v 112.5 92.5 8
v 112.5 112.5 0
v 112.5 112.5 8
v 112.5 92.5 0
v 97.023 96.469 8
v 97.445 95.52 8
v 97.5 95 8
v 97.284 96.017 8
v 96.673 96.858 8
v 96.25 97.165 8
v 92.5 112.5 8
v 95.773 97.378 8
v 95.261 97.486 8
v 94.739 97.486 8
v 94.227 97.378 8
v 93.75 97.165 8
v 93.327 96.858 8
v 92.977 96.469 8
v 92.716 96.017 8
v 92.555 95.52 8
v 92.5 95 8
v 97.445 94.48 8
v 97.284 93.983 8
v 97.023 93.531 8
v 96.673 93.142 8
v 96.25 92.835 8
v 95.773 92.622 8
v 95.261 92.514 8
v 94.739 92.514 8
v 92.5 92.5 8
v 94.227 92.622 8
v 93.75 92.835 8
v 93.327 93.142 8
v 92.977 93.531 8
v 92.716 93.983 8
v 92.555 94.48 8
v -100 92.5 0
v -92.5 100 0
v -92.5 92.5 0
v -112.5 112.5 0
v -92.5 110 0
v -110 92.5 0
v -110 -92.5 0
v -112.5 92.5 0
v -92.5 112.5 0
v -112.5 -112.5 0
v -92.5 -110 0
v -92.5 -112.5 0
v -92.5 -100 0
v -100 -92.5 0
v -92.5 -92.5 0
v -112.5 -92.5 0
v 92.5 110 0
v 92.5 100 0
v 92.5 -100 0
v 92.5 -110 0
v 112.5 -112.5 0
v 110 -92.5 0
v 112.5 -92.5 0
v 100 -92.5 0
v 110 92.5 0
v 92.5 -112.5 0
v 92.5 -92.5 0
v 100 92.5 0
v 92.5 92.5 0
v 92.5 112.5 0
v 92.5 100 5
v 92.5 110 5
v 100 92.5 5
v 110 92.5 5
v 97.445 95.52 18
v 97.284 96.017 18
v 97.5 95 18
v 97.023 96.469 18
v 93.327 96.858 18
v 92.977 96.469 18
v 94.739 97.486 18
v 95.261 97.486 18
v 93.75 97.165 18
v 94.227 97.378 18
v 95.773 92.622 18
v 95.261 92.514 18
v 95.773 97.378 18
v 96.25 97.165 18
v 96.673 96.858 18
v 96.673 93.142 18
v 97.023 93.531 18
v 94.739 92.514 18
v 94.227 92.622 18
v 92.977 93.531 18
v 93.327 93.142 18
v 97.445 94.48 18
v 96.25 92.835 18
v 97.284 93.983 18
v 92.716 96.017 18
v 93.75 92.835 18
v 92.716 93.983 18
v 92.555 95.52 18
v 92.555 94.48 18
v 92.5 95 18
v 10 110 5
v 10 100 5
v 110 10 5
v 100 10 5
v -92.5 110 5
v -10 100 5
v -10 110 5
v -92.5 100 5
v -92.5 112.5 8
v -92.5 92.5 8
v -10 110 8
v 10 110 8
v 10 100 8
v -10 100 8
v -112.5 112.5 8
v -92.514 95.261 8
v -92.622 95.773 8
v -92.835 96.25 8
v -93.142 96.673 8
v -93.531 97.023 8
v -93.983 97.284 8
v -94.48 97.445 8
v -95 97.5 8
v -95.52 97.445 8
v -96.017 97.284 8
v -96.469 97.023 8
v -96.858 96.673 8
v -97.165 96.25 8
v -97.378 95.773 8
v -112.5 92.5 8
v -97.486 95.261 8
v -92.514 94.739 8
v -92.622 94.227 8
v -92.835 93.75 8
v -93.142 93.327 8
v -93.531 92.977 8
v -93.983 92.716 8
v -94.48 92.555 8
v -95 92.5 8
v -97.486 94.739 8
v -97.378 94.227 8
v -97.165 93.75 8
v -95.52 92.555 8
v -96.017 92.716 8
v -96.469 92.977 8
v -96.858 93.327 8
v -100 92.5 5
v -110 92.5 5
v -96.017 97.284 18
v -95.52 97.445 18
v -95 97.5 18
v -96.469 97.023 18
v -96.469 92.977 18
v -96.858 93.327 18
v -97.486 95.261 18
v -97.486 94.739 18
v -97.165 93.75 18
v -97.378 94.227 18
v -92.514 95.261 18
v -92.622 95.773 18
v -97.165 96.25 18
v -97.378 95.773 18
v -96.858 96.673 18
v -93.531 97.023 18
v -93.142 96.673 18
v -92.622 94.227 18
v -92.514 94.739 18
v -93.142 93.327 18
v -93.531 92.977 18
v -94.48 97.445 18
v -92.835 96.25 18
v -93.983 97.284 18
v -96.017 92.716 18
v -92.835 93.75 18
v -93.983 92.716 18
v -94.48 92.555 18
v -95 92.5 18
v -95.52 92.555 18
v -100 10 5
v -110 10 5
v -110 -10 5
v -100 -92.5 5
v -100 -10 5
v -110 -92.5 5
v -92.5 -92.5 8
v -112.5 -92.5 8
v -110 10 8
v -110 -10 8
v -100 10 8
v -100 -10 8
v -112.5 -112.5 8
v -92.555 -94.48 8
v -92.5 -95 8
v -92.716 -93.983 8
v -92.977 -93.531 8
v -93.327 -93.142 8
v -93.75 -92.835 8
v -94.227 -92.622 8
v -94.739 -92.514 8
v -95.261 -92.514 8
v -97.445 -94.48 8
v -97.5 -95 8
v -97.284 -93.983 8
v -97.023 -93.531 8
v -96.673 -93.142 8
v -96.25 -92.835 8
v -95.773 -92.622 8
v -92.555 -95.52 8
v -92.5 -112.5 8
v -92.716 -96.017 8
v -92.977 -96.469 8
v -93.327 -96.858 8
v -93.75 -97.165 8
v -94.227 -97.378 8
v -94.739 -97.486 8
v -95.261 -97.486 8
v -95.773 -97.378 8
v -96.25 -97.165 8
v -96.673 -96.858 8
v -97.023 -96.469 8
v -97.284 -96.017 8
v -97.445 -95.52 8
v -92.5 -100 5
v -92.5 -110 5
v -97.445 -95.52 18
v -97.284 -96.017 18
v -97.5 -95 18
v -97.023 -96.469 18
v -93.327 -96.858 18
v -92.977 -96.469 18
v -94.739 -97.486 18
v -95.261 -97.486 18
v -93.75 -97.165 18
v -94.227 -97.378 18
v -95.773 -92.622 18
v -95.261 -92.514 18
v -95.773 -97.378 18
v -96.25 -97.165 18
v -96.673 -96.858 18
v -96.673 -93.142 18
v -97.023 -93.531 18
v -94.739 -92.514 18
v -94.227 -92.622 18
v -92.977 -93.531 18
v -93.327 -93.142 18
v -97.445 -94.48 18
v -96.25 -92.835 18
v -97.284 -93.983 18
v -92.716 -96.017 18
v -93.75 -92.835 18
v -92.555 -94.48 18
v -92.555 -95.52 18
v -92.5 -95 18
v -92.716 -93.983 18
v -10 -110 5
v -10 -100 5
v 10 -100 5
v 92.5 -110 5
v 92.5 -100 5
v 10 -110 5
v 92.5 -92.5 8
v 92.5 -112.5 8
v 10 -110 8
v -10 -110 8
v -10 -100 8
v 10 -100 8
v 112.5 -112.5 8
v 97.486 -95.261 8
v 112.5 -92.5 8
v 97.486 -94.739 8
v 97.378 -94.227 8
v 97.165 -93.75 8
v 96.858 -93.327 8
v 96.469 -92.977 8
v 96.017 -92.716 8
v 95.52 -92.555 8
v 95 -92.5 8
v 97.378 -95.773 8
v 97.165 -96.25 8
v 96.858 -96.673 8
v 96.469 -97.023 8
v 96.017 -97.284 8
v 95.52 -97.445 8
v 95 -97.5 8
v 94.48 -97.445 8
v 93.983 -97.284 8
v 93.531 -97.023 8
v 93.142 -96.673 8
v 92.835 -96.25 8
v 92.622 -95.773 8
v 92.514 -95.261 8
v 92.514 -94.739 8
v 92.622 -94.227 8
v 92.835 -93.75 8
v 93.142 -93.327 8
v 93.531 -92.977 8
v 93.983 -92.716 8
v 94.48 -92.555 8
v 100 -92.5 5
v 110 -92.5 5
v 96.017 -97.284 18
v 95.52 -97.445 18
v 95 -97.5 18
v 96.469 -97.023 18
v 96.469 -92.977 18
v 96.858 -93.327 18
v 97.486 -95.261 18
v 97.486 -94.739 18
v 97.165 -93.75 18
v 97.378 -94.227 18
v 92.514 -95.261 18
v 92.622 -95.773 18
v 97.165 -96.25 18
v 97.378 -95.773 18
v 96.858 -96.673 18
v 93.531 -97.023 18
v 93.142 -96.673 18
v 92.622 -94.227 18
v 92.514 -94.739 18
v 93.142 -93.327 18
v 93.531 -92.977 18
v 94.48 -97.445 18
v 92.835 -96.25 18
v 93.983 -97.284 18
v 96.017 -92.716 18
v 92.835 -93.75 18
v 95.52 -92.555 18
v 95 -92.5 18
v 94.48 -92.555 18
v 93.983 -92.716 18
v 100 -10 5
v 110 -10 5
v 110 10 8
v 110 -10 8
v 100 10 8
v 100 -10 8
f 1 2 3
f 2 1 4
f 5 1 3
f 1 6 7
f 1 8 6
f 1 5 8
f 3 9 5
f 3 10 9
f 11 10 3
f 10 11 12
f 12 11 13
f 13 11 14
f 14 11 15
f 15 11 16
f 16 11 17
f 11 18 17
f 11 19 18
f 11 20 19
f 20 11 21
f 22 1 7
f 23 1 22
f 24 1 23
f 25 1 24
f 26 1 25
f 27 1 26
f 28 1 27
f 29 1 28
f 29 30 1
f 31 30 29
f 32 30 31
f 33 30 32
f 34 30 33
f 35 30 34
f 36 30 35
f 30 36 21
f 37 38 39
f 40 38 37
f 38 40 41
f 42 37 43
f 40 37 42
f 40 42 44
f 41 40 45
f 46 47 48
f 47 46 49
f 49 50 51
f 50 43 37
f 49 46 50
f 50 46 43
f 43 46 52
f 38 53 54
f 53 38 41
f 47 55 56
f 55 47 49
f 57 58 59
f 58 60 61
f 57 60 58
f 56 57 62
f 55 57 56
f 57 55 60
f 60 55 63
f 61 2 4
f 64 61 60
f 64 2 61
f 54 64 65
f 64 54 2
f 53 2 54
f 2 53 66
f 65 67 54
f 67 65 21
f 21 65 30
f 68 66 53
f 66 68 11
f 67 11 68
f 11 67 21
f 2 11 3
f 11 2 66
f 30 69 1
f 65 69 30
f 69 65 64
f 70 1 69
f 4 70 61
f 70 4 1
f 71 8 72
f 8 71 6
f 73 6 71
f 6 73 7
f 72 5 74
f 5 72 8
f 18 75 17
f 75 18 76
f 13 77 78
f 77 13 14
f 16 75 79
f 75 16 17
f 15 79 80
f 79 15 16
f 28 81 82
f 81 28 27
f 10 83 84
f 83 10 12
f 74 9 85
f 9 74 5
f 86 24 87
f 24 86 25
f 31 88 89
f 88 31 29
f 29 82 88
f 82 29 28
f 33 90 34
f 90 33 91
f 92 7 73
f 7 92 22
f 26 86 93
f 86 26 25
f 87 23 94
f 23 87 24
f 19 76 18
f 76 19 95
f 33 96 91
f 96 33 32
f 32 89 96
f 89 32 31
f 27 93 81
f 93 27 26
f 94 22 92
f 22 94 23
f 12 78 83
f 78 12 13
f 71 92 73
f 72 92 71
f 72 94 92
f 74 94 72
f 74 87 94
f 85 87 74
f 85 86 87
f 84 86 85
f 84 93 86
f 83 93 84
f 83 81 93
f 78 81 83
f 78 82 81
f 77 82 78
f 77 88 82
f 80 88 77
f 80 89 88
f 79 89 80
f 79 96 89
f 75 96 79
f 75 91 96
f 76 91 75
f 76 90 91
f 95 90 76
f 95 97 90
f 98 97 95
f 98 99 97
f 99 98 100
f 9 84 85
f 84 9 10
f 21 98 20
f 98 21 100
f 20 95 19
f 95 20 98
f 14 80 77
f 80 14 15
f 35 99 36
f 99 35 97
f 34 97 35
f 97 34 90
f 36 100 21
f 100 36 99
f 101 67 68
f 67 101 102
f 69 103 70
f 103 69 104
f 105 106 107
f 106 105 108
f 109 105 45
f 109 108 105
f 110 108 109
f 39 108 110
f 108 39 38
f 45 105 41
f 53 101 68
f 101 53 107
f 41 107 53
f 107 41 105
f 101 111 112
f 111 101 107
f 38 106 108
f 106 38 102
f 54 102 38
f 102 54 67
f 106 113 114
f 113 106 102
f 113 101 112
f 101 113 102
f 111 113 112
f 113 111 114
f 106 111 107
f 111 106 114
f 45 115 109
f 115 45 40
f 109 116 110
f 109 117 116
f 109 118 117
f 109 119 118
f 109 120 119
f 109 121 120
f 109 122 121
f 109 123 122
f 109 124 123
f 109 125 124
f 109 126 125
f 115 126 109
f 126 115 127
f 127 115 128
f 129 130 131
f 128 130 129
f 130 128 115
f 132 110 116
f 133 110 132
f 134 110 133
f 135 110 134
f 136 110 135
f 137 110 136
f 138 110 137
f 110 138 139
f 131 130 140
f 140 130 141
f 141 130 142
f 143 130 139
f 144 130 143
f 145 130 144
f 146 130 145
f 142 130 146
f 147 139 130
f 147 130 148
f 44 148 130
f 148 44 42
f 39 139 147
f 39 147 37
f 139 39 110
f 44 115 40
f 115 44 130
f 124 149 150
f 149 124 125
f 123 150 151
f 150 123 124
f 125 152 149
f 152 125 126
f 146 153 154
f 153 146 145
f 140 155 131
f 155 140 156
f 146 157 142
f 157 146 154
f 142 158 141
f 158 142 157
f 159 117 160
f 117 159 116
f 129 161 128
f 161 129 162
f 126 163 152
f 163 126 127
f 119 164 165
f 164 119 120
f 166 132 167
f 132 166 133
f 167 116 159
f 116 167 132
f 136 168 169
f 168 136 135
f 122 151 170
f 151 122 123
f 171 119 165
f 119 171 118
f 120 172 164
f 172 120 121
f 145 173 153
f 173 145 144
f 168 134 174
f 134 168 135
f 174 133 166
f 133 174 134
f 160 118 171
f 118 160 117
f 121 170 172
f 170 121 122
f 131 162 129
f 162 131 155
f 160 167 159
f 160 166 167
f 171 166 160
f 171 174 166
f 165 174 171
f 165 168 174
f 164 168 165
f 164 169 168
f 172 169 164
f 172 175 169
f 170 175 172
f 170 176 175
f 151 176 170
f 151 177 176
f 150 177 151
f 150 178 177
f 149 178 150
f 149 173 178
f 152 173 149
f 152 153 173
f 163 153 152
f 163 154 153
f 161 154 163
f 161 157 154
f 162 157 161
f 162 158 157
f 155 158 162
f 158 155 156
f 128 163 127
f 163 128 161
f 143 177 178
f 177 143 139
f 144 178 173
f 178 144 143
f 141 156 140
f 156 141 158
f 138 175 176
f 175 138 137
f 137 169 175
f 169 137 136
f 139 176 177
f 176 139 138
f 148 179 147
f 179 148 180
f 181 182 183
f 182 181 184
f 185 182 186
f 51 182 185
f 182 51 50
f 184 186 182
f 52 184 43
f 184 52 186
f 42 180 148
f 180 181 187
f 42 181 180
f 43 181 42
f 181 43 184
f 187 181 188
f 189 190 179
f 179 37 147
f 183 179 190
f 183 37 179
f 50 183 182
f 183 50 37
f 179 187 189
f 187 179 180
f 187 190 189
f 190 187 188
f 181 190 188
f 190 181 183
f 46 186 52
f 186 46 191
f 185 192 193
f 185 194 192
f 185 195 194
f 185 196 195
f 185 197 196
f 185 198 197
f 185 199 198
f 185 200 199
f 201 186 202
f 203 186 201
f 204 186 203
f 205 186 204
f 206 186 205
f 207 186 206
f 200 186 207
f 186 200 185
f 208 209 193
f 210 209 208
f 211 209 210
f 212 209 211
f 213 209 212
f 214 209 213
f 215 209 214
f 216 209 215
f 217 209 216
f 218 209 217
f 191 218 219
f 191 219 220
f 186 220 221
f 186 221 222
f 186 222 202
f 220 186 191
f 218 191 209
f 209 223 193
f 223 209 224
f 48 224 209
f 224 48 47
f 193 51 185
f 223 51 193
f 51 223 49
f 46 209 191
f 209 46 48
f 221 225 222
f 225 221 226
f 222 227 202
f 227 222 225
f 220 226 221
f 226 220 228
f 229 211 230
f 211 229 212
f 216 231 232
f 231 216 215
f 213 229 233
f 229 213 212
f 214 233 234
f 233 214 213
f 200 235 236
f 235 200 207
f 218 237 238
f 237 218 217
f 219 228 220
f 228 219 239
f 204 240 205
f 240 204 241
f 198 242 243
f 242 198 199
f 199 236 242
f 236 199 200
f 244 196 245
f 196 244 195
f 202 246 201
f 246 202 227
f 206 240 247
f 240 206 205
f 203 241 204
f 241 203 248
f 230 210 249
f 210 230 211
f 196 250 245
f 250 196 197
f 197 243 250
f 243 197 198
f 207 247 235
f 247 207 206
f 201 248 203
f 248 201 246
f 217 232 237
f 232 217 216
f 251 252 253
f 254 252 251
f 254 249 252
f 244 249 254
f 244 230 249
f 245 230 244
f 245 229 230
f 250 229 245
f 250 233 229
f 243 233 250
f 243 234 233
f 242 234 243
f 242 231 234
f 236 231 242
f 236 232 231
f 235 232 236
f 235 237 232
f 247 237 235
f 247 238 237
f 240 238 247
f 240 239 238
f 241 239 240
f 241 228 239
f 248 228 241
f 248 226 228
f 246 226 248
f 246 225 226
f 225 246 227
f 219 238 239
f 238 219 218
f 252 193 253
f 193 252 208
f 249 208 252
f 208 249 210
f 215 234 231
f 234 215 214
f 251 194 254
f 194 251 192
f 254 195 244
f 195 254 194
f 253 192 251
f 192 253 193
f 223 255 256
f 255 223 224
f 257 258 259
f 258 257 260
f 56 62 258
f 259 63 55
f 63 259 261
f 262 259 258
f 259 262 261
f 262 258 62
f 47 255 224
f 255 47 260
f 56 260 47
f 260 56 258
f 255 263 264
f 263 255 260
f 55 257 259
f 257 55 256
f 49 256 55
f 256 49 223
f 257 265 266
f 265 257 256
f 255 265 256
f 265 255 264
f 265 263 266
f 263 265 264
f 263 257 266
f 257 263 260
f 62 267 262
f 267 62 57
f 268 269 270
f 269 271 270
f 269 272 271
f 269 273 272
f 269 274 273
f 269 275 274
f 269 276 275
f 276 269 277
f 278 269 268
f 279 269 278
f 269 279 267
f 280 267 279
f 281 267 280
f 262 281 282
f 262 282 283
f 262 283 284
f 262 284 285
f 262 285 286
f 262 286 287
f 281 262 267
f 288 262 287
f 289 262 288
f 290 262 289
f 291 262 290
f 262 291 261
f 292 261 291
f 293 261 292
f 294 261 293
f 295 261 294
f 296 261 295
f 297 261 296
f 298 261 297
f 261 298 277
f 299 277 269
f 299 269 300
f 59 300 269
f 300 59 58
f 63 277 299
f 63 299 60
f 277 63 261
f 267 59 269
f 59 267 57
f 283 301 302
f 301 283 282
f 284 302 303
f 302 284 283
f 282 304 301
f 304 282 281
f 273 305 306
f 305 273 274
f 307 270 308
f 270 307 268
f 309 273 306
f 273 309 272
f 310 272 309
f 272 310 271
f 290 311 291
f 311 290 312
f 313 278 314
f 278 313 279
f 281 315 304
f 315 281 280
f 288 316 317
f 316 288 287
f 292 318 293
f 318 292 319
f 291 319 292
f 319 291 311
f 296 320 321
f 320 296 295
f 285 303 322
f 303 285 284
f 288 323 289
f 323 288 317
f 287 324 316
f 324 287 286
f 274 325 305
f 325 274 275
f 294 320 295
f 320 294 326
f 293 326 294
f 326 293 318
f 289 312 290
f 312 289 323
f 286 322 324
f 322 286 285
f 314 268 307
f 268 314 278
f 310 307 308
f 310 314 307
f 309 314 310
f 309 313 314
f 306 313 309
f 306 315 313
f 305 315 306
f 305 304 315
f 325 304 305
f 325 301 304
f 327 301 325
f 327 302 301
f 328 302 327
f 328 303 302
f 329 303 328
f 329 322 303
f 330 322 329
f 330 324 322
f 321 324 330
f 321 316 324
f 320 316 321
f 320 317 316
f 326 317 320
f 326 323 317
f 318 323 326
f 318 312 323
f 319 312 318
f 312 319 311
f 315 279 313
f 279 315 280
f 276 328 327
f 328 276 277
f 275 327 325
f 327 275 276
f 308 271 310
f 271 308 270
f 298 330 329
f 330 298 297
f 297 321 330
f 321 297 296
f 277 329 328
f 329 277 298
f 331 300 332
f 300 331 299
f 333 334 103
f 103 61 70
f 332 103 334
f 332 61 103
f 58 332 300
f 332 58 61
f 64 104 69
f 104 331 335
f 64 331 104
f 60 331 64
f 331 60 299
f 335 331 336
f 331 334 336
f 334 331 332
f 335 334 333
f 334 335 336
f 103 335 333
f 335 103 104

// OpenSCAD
// This is an adapter for the outdoor lantern.

module _norm_tongue(tolerance=0) {
    corners = [[0, 2 - tolerance], [0, -2 - tolerance], [4 - tolerance, -3 - tolerance], [4 - tolerance, 3 - tolerance]];
    linear_extrude(height=5)
        polygon( corners, paths=[[0, 1, 2, 3]]);
}

module tongue(x, y, theta, tolerance=0) {
    translate([x, y, 0])
        rotate([0, 0, theta])
            _norm_tongue(tolerance=tolerance);
}

outer_size = 195 + 2 * 15;
corner_size = 20;
corner_height = 8;
nub_radius = 5 / 2;
edge_length = outer_size - 2 * corner_size;
edge_width = 10;
edge_height = 5;

//base size
%translate([0, 0, -1 / 2]) square([outer_size, outer_size], center=true);

module edge() {
    translate([0, 0, corner_height / 2]) cube([20, edge_width, corner_height], center=true);
    difference() {
        translate([0, 0, edge_height / 2]) cube([edge_length, edge_width, edge_height], center=true);
        tongue(edge_length / 2, 0, 180);
        tongue(-edge_length / 2, 0, 0);
    }
}

module corner() {
    cube([corner_size, corner_size, corner_height]);
    translate([nub_radius, nub_radius, 0]) cylinder(r=nub_radius, h=18, $fn=30);
    tongue(0, corner_size / 2 + nub_radius, 180);
    tongue(corner_size / 2 + nub_radius, 0, -90);
}

for (angle = [0:90:270]) {
    rotate([0, 0, angle]) {
        translate([edge_length / 2, edge_length / 2, 0]) corner();
        translate([0, edge_length / 2 + corner_size / 2 + nub_radius, 0]) edge();
    }
}
